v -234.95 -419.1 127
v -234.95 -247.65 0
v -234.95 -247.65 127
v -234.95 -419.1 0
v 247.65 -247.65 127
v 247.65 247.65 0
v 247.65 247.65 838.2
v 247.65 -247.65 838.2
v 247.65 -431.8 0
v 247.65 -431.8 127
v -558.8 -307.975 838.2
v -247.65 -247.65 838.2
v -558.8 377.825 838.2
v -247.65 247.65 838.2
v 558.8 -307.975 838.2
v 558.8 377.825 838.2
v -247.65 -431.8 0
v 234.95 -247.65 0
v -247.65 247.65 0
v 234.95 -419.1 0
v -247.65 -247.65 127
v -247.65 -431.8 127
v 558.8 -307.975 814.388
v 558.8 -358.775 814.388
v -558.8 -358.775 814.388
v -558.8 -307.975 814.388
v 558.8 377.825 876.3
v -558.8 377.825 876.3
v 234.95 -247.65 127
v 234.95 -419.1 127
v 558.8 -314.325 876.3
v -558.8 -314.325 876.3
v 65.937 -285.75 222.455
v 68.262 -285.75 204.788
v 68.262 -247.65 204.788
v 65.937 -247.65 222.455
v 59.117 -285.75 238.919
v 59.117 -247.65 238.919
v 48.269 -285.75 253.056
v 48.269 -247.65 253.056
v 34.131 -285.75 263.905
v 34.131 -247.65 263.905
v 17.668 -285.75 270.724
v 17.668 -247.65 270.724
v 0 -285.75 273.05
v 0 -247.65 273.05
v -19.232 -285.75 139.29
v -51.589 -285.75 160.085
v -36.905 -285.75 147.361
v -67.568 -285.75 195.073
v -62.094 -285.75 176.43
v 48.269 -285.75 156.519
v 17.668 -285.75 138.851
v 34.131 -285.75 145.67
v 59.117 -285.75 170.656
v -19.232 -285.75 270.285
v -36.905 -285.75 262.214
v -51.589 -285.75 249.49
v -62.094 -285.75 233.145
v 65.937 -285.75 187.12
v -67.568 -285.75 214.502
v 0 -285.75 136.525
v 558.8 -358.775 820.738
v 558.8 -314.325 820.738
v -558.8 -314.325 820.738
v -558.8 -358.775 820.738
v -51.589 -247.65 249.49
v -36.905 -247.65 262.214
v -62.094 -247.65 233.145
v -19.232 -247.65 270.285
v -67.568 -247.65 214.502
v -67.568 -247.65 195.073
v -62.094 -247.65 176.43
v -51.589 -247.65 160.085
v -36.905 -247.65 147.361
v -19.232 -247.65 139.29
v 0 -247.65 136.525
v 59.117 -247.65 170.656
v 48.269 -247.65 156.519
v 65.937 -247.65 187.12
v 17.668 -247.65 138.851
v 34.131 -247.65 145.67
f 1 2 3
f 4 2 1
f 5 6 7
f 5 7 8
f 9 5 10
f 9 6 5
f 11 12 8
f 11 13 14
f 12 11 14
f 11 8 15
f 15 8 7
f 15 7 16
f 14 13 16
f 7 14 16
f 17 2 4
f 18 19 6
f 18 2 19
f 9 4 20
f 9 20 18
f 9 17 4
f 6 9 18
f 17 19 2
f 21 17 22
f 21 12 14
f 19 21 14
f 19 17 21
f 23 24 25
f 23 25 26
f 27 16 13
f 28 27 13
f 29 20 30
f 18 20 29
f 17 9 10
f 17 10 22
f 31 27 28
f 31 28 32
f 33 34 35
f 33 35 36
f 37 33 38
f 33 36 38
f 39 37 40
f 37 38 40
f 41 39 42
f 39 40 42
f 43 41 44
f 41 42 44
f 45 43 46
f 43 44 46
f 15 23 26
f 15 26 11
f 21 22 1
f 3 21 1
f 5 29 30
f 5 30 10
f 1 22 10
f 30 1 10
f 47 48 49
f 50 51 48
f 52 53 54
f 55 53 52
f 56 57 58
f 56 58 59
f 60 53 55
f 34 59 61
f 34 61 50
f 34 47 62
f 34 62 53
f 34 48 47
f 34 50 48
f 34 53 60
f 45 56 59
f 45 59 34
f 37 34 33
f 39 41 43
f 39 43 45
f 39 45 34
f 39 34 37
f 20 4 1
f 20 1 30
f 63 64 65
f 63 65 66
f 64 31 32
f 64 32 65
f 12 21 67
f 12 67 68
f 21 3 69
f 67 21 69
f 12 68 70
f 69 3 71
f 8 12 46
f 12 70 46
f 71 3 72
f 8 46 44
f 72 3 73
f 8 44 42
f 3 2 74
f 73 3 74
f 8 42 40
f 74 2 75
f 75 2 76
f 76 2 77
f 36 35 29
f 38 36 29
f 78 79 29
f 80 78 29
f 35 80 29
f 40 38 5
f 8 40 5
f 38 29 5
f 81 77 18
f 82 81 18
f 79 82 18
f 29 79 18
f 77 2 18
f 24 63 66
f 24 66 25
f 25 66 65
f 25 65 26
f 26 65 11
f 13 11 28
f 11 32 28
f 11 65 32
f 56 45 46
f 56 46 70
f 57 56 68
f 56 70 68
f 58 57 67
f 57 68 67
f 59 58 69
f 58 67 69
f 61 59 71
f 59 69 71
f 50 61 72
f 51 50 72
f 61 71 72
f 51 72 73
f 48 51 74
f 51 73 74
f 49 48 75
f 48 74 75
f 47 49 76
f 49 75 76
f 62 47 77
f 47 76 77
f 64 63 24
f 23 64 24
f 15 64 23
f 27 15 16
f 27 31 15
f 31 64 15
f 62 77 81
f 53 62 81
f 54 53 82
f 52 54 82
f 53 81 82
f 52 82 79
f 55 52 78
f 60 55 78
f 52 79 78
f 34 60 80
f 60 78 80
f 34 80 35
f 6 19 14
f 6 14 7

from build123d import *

# Parameters (mm, degrees)
F0_W     = 495.3
F0_H     = 495.3
F1_DEPTH = 838.2
F3_DEPTH = 38.1
F5_DEPTH = 38.1
F7_DEPTH = 1117.6
F9_DEPTH = 127


with BuildPart() as f1:
    # F0 (on Top) → F1 (new body)
    with BuildSketch(Plane.XY):
        Rectangle(F0_W, F0_H)
    extrude(amount=F1_DEPTH)

    # F2 (on face) → F3 (join)
    with BuildSketch(Plane.XZ.offset(247.65)):
        with BuildLine():
            ThreePointArc((0, 273.05), (-68.2625, 204.7875), (0, 136.525))
            Line((0, 136.525), (0, 273.05))
        make_face()
        with BuildLine():
            Line((0, 273.05), (0, 136.525))
            ThreePointArc((0, 136.525), (48.268877, 156.518623), (68.2625, 204.7875))
            ThreePointArc((68.2625, 204.7875), (48.268877, 253.056377), (0, 273.05))
        make_face()
    extrude(amount=F3_DEPTH)

    # F4 (on face) → F5 (join)
    with BuildSketch(Plane.XY.offset(838.2)):
        Polygon((-558.8, 377.825), (-558.8, -247.65), (-558.8, -307.975), (558.8, -307.975), (558.8, -247.65), (558.8, 377.825), align=None)
    extrude(amount=F5_DEPTH)

    # F6 (on face) → F7 (join)
    with BuildSketch(Plane.YZ.offset(558.8)):
        Polygon((-307.975, 838.2), (-307.975, 876.3), (-314.325, 876.3), (-314.325, 820.7375), (-358.775, 820.7375), (-358.775, 814.3875), (-307.975, 814.3875), align=None)
    extrude(amount=-F7_DEPTH)

    # F8 (on face) → F9 (join)
    with BuildSketch(Plane(origin=(0, 0, 0), x_dir=(1, 0, 0), z_dir=(0, 0, -1))):
        Polygon((234.95, 247.65), (247.65, 247.65), (247.65, 431.8), (-247.65, 431.8), (-247.65, 247.65), (-234.95, 247.65), (-234.95, 419.1), (234.95, 419.1), align=None)
    extrude(amount=-F9_DEPTH)


solid = f1.part
